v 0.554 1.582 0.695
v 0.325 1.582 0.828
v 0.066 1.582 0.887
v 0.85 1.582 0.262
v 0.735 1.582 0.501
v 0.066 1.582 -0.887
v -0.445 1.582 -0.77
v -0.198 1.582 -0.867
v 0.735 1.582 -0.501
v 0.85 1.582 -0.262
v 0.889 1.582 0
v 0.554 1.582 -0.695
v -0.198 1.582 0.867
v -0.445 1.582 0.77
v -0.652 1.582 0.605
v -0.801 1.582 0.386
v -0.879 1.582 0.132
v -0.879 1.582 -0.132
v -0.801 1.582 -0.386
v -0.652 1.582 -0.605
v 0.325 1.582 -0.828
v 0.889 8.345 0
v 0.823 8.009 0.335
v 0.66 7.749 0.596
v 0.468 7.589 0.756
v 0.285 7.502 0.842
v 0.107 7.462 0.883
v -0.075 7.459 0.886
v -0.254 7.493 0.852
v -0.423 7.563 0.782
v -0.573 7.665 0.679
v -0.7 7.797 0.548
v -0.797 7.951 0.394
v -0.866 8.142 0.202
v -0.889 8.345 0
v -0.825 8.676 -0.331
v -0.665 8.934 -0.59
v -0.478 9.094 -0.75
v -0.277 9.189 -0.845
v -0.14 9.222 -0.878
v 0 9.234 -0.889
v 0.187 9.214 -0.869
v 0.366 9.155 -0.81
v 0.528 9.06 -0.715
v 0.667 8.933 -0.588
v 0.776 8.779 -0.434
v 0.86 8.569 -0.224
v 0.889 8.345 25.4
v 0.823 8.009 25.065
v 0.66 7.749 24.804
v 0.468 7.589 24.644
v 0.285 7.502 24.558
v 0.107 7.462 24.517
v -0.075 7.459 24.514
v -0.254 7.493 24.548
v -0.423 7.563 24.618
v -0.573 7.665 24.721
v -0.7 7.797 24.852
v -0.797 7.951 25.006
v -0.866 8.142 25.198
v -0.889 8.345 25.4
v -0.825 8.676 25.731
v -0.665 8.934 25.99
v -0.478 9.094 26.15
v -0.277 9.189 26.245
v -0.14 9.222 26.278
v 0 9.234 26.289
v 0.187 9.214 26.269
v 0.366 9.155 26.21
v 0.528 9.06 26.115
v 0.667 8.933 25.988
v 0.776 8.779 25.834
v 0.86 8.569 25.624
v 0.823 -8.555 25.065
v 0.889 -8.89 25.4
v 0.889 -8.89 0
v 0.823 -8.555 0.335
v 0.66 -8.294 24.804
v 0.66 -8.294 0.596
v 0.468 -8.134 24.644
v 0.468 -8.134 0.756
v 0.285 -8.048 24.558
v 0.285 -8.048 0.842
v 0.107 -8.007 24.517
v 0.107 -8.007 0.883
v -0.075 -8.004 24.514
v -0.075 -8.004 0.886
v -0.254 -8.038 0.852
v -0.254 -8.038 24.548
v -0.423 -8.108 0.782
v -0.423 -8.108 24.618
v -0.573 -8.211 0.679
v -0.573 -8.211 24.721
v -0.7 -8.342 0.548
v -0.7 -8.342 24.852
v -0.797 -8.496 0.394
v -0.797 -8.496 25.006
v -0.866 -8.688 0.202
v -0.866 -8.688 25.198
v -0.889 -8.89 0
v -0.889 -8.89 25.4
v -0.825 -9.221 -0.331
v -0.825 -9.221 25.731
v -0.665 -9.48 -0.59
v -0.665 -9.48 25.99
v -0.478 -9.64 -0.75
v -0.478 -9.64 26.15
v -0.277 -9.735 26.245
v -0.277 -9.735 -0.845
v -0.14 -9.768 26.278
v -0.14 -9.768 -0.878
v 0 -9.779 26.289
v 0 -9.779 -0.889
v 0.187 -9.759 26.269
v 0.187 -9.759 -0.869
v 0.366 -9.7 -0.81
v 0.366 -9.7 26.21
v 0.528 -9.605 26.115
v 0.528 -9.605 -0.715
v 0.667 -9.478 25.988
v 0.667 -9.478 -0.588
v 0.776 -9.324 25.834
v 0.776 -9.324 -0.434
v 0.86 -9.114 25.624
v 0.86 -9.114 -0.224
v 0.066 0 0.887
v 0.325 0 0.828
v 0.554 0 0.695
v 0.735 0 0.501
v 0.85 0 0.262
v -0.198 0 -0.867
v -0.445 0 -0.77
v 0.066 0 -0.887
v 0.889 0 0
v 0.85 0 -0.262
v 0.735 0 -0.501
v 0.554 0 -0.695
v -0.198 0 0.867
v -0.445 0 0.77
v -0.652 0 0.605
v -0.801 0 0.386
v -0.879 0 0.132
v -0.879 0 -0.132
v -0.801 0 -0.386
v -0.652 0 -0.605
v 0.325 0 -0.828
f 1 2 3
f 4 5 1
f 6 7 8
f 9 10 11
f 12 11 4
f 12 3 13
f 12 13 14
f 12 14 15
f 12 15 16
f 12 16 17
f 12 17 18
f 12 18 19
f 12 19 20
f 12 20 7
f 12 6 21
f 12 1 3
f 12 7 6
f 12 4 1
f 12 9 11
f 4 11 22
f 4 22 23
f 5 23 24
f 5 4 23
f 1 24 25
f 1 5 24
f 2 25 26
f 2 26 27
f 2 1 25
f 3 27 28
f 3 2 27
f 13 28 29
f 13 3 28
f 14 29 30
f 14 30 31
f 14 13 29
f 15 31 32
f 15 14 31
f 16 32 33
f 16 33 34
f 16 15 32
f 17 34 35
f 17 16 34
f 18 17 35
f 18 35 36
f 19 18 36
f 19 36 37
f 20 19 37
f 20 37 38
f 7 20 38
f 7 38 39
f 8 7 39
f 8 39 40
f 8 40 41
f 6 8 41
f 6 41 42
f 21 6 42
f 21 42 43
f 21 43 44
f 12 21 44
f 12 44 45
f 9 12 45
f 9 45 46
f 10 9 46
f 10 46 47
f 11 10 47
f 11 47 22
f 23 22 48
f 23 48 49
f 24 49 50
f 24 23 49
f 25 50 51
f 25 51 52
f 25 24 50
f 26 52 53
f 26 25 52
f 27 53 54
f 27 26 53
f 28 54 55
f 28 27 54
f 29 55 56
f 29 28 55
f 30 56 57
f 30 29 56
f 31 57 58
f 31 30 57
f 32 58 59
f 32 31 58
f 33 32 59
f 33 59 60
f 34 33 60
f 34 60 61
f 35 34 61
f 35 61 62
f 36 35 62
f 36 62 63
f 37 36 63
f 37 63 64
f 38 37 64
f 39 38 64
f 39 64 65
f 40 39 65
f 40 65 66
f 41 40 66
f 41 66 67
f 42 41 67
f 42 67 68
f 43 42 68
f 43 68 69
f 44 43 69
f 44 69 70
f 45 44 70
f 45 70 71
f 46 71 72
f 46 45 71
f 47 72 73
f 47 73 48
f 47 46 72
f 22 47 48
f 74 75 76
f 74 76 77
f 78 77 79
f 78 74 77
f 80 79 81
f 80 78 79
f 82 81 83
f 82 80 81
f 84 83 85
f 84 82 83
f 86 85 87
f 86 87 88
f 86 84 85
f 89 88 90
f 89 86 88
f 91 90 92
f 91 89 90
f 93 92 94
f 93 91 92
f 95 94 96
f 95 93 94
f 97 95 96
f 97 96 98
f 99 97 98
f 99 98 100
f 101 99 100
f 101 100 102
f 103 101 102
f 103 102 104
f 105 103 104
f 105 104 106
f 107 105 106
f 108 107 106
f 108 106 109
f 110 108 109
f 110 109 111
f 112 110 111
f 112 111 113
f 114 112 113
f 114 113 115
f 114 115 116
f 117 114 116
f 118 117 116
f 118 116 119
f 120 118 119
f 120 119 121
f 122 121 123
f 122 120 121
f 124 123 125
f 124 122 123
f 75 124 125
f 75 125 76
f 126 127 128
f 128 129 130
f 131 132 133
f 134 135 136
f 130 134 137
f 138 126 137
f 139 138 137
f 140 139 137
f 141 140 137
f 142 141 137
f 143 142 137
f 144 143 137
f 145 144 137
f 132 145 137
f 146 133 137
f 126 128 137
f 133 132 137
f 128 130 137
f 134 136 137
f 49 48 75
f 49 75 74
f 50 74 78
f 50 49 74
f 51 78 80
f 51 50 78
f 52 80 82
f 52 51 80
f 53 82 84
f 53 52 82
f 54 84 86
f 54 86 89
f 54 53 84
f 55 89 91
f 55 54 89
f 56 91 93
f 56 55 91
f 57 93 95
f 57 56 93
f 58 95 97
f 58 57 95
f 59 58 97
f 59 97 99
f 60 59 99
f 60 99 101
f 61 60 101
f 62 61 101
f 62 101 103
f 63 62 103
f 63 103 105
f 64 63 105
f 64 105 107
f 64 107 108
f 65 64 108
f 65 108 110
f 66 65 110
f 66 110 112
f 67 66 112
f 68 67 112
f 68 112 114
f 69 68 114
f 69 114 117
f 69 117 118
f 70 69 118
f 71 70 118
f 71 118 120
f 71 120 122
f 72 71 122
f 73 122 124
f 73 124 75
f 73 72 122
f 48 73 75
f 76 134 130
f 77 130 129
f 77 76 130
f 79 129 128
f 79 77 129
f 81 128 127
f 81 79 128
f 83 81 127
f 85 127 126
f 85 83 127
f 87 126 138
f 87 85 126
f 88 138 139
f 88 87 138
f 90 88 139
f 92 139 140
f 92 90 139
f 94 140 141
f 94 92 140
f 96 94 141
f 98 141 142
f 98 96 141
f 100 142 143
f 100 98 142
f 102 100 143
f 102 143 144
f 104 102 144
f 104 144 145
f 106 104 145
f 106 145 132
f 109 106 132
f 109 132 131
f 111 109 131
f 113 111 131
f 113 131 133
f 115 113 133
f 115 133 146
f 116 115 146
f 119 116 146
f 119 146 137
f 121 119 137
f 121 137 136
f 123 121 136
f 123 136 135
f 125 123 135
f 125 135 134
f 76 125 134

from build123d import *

# Parameters (mm, degrees)
F0_R = 0.889


with BuildPart() as f2:
    # F2: sweep along a path in F1
    with BuildLine(Plane.YZ) as f2_path:
        Line((0, 0), (-8.89, 0))
        Line((-8.89, 0), (-8.89, 25.4))
        Line((-8.89, 25.4), (8.3446010148, 25.4))
        Line((8.3446010148, 25.4), (8.3446010148, 0))
        Line((8.3446010148, 0), (1.5816572689, 0))
    # F0 (on Front) → F2 (sweep)
    with BuildSketch(Plane.XZ):
        Circle(F0_R)
    sweep(path=f2_path.line, transition=Transition.RIGHT)


solid = f2.part
